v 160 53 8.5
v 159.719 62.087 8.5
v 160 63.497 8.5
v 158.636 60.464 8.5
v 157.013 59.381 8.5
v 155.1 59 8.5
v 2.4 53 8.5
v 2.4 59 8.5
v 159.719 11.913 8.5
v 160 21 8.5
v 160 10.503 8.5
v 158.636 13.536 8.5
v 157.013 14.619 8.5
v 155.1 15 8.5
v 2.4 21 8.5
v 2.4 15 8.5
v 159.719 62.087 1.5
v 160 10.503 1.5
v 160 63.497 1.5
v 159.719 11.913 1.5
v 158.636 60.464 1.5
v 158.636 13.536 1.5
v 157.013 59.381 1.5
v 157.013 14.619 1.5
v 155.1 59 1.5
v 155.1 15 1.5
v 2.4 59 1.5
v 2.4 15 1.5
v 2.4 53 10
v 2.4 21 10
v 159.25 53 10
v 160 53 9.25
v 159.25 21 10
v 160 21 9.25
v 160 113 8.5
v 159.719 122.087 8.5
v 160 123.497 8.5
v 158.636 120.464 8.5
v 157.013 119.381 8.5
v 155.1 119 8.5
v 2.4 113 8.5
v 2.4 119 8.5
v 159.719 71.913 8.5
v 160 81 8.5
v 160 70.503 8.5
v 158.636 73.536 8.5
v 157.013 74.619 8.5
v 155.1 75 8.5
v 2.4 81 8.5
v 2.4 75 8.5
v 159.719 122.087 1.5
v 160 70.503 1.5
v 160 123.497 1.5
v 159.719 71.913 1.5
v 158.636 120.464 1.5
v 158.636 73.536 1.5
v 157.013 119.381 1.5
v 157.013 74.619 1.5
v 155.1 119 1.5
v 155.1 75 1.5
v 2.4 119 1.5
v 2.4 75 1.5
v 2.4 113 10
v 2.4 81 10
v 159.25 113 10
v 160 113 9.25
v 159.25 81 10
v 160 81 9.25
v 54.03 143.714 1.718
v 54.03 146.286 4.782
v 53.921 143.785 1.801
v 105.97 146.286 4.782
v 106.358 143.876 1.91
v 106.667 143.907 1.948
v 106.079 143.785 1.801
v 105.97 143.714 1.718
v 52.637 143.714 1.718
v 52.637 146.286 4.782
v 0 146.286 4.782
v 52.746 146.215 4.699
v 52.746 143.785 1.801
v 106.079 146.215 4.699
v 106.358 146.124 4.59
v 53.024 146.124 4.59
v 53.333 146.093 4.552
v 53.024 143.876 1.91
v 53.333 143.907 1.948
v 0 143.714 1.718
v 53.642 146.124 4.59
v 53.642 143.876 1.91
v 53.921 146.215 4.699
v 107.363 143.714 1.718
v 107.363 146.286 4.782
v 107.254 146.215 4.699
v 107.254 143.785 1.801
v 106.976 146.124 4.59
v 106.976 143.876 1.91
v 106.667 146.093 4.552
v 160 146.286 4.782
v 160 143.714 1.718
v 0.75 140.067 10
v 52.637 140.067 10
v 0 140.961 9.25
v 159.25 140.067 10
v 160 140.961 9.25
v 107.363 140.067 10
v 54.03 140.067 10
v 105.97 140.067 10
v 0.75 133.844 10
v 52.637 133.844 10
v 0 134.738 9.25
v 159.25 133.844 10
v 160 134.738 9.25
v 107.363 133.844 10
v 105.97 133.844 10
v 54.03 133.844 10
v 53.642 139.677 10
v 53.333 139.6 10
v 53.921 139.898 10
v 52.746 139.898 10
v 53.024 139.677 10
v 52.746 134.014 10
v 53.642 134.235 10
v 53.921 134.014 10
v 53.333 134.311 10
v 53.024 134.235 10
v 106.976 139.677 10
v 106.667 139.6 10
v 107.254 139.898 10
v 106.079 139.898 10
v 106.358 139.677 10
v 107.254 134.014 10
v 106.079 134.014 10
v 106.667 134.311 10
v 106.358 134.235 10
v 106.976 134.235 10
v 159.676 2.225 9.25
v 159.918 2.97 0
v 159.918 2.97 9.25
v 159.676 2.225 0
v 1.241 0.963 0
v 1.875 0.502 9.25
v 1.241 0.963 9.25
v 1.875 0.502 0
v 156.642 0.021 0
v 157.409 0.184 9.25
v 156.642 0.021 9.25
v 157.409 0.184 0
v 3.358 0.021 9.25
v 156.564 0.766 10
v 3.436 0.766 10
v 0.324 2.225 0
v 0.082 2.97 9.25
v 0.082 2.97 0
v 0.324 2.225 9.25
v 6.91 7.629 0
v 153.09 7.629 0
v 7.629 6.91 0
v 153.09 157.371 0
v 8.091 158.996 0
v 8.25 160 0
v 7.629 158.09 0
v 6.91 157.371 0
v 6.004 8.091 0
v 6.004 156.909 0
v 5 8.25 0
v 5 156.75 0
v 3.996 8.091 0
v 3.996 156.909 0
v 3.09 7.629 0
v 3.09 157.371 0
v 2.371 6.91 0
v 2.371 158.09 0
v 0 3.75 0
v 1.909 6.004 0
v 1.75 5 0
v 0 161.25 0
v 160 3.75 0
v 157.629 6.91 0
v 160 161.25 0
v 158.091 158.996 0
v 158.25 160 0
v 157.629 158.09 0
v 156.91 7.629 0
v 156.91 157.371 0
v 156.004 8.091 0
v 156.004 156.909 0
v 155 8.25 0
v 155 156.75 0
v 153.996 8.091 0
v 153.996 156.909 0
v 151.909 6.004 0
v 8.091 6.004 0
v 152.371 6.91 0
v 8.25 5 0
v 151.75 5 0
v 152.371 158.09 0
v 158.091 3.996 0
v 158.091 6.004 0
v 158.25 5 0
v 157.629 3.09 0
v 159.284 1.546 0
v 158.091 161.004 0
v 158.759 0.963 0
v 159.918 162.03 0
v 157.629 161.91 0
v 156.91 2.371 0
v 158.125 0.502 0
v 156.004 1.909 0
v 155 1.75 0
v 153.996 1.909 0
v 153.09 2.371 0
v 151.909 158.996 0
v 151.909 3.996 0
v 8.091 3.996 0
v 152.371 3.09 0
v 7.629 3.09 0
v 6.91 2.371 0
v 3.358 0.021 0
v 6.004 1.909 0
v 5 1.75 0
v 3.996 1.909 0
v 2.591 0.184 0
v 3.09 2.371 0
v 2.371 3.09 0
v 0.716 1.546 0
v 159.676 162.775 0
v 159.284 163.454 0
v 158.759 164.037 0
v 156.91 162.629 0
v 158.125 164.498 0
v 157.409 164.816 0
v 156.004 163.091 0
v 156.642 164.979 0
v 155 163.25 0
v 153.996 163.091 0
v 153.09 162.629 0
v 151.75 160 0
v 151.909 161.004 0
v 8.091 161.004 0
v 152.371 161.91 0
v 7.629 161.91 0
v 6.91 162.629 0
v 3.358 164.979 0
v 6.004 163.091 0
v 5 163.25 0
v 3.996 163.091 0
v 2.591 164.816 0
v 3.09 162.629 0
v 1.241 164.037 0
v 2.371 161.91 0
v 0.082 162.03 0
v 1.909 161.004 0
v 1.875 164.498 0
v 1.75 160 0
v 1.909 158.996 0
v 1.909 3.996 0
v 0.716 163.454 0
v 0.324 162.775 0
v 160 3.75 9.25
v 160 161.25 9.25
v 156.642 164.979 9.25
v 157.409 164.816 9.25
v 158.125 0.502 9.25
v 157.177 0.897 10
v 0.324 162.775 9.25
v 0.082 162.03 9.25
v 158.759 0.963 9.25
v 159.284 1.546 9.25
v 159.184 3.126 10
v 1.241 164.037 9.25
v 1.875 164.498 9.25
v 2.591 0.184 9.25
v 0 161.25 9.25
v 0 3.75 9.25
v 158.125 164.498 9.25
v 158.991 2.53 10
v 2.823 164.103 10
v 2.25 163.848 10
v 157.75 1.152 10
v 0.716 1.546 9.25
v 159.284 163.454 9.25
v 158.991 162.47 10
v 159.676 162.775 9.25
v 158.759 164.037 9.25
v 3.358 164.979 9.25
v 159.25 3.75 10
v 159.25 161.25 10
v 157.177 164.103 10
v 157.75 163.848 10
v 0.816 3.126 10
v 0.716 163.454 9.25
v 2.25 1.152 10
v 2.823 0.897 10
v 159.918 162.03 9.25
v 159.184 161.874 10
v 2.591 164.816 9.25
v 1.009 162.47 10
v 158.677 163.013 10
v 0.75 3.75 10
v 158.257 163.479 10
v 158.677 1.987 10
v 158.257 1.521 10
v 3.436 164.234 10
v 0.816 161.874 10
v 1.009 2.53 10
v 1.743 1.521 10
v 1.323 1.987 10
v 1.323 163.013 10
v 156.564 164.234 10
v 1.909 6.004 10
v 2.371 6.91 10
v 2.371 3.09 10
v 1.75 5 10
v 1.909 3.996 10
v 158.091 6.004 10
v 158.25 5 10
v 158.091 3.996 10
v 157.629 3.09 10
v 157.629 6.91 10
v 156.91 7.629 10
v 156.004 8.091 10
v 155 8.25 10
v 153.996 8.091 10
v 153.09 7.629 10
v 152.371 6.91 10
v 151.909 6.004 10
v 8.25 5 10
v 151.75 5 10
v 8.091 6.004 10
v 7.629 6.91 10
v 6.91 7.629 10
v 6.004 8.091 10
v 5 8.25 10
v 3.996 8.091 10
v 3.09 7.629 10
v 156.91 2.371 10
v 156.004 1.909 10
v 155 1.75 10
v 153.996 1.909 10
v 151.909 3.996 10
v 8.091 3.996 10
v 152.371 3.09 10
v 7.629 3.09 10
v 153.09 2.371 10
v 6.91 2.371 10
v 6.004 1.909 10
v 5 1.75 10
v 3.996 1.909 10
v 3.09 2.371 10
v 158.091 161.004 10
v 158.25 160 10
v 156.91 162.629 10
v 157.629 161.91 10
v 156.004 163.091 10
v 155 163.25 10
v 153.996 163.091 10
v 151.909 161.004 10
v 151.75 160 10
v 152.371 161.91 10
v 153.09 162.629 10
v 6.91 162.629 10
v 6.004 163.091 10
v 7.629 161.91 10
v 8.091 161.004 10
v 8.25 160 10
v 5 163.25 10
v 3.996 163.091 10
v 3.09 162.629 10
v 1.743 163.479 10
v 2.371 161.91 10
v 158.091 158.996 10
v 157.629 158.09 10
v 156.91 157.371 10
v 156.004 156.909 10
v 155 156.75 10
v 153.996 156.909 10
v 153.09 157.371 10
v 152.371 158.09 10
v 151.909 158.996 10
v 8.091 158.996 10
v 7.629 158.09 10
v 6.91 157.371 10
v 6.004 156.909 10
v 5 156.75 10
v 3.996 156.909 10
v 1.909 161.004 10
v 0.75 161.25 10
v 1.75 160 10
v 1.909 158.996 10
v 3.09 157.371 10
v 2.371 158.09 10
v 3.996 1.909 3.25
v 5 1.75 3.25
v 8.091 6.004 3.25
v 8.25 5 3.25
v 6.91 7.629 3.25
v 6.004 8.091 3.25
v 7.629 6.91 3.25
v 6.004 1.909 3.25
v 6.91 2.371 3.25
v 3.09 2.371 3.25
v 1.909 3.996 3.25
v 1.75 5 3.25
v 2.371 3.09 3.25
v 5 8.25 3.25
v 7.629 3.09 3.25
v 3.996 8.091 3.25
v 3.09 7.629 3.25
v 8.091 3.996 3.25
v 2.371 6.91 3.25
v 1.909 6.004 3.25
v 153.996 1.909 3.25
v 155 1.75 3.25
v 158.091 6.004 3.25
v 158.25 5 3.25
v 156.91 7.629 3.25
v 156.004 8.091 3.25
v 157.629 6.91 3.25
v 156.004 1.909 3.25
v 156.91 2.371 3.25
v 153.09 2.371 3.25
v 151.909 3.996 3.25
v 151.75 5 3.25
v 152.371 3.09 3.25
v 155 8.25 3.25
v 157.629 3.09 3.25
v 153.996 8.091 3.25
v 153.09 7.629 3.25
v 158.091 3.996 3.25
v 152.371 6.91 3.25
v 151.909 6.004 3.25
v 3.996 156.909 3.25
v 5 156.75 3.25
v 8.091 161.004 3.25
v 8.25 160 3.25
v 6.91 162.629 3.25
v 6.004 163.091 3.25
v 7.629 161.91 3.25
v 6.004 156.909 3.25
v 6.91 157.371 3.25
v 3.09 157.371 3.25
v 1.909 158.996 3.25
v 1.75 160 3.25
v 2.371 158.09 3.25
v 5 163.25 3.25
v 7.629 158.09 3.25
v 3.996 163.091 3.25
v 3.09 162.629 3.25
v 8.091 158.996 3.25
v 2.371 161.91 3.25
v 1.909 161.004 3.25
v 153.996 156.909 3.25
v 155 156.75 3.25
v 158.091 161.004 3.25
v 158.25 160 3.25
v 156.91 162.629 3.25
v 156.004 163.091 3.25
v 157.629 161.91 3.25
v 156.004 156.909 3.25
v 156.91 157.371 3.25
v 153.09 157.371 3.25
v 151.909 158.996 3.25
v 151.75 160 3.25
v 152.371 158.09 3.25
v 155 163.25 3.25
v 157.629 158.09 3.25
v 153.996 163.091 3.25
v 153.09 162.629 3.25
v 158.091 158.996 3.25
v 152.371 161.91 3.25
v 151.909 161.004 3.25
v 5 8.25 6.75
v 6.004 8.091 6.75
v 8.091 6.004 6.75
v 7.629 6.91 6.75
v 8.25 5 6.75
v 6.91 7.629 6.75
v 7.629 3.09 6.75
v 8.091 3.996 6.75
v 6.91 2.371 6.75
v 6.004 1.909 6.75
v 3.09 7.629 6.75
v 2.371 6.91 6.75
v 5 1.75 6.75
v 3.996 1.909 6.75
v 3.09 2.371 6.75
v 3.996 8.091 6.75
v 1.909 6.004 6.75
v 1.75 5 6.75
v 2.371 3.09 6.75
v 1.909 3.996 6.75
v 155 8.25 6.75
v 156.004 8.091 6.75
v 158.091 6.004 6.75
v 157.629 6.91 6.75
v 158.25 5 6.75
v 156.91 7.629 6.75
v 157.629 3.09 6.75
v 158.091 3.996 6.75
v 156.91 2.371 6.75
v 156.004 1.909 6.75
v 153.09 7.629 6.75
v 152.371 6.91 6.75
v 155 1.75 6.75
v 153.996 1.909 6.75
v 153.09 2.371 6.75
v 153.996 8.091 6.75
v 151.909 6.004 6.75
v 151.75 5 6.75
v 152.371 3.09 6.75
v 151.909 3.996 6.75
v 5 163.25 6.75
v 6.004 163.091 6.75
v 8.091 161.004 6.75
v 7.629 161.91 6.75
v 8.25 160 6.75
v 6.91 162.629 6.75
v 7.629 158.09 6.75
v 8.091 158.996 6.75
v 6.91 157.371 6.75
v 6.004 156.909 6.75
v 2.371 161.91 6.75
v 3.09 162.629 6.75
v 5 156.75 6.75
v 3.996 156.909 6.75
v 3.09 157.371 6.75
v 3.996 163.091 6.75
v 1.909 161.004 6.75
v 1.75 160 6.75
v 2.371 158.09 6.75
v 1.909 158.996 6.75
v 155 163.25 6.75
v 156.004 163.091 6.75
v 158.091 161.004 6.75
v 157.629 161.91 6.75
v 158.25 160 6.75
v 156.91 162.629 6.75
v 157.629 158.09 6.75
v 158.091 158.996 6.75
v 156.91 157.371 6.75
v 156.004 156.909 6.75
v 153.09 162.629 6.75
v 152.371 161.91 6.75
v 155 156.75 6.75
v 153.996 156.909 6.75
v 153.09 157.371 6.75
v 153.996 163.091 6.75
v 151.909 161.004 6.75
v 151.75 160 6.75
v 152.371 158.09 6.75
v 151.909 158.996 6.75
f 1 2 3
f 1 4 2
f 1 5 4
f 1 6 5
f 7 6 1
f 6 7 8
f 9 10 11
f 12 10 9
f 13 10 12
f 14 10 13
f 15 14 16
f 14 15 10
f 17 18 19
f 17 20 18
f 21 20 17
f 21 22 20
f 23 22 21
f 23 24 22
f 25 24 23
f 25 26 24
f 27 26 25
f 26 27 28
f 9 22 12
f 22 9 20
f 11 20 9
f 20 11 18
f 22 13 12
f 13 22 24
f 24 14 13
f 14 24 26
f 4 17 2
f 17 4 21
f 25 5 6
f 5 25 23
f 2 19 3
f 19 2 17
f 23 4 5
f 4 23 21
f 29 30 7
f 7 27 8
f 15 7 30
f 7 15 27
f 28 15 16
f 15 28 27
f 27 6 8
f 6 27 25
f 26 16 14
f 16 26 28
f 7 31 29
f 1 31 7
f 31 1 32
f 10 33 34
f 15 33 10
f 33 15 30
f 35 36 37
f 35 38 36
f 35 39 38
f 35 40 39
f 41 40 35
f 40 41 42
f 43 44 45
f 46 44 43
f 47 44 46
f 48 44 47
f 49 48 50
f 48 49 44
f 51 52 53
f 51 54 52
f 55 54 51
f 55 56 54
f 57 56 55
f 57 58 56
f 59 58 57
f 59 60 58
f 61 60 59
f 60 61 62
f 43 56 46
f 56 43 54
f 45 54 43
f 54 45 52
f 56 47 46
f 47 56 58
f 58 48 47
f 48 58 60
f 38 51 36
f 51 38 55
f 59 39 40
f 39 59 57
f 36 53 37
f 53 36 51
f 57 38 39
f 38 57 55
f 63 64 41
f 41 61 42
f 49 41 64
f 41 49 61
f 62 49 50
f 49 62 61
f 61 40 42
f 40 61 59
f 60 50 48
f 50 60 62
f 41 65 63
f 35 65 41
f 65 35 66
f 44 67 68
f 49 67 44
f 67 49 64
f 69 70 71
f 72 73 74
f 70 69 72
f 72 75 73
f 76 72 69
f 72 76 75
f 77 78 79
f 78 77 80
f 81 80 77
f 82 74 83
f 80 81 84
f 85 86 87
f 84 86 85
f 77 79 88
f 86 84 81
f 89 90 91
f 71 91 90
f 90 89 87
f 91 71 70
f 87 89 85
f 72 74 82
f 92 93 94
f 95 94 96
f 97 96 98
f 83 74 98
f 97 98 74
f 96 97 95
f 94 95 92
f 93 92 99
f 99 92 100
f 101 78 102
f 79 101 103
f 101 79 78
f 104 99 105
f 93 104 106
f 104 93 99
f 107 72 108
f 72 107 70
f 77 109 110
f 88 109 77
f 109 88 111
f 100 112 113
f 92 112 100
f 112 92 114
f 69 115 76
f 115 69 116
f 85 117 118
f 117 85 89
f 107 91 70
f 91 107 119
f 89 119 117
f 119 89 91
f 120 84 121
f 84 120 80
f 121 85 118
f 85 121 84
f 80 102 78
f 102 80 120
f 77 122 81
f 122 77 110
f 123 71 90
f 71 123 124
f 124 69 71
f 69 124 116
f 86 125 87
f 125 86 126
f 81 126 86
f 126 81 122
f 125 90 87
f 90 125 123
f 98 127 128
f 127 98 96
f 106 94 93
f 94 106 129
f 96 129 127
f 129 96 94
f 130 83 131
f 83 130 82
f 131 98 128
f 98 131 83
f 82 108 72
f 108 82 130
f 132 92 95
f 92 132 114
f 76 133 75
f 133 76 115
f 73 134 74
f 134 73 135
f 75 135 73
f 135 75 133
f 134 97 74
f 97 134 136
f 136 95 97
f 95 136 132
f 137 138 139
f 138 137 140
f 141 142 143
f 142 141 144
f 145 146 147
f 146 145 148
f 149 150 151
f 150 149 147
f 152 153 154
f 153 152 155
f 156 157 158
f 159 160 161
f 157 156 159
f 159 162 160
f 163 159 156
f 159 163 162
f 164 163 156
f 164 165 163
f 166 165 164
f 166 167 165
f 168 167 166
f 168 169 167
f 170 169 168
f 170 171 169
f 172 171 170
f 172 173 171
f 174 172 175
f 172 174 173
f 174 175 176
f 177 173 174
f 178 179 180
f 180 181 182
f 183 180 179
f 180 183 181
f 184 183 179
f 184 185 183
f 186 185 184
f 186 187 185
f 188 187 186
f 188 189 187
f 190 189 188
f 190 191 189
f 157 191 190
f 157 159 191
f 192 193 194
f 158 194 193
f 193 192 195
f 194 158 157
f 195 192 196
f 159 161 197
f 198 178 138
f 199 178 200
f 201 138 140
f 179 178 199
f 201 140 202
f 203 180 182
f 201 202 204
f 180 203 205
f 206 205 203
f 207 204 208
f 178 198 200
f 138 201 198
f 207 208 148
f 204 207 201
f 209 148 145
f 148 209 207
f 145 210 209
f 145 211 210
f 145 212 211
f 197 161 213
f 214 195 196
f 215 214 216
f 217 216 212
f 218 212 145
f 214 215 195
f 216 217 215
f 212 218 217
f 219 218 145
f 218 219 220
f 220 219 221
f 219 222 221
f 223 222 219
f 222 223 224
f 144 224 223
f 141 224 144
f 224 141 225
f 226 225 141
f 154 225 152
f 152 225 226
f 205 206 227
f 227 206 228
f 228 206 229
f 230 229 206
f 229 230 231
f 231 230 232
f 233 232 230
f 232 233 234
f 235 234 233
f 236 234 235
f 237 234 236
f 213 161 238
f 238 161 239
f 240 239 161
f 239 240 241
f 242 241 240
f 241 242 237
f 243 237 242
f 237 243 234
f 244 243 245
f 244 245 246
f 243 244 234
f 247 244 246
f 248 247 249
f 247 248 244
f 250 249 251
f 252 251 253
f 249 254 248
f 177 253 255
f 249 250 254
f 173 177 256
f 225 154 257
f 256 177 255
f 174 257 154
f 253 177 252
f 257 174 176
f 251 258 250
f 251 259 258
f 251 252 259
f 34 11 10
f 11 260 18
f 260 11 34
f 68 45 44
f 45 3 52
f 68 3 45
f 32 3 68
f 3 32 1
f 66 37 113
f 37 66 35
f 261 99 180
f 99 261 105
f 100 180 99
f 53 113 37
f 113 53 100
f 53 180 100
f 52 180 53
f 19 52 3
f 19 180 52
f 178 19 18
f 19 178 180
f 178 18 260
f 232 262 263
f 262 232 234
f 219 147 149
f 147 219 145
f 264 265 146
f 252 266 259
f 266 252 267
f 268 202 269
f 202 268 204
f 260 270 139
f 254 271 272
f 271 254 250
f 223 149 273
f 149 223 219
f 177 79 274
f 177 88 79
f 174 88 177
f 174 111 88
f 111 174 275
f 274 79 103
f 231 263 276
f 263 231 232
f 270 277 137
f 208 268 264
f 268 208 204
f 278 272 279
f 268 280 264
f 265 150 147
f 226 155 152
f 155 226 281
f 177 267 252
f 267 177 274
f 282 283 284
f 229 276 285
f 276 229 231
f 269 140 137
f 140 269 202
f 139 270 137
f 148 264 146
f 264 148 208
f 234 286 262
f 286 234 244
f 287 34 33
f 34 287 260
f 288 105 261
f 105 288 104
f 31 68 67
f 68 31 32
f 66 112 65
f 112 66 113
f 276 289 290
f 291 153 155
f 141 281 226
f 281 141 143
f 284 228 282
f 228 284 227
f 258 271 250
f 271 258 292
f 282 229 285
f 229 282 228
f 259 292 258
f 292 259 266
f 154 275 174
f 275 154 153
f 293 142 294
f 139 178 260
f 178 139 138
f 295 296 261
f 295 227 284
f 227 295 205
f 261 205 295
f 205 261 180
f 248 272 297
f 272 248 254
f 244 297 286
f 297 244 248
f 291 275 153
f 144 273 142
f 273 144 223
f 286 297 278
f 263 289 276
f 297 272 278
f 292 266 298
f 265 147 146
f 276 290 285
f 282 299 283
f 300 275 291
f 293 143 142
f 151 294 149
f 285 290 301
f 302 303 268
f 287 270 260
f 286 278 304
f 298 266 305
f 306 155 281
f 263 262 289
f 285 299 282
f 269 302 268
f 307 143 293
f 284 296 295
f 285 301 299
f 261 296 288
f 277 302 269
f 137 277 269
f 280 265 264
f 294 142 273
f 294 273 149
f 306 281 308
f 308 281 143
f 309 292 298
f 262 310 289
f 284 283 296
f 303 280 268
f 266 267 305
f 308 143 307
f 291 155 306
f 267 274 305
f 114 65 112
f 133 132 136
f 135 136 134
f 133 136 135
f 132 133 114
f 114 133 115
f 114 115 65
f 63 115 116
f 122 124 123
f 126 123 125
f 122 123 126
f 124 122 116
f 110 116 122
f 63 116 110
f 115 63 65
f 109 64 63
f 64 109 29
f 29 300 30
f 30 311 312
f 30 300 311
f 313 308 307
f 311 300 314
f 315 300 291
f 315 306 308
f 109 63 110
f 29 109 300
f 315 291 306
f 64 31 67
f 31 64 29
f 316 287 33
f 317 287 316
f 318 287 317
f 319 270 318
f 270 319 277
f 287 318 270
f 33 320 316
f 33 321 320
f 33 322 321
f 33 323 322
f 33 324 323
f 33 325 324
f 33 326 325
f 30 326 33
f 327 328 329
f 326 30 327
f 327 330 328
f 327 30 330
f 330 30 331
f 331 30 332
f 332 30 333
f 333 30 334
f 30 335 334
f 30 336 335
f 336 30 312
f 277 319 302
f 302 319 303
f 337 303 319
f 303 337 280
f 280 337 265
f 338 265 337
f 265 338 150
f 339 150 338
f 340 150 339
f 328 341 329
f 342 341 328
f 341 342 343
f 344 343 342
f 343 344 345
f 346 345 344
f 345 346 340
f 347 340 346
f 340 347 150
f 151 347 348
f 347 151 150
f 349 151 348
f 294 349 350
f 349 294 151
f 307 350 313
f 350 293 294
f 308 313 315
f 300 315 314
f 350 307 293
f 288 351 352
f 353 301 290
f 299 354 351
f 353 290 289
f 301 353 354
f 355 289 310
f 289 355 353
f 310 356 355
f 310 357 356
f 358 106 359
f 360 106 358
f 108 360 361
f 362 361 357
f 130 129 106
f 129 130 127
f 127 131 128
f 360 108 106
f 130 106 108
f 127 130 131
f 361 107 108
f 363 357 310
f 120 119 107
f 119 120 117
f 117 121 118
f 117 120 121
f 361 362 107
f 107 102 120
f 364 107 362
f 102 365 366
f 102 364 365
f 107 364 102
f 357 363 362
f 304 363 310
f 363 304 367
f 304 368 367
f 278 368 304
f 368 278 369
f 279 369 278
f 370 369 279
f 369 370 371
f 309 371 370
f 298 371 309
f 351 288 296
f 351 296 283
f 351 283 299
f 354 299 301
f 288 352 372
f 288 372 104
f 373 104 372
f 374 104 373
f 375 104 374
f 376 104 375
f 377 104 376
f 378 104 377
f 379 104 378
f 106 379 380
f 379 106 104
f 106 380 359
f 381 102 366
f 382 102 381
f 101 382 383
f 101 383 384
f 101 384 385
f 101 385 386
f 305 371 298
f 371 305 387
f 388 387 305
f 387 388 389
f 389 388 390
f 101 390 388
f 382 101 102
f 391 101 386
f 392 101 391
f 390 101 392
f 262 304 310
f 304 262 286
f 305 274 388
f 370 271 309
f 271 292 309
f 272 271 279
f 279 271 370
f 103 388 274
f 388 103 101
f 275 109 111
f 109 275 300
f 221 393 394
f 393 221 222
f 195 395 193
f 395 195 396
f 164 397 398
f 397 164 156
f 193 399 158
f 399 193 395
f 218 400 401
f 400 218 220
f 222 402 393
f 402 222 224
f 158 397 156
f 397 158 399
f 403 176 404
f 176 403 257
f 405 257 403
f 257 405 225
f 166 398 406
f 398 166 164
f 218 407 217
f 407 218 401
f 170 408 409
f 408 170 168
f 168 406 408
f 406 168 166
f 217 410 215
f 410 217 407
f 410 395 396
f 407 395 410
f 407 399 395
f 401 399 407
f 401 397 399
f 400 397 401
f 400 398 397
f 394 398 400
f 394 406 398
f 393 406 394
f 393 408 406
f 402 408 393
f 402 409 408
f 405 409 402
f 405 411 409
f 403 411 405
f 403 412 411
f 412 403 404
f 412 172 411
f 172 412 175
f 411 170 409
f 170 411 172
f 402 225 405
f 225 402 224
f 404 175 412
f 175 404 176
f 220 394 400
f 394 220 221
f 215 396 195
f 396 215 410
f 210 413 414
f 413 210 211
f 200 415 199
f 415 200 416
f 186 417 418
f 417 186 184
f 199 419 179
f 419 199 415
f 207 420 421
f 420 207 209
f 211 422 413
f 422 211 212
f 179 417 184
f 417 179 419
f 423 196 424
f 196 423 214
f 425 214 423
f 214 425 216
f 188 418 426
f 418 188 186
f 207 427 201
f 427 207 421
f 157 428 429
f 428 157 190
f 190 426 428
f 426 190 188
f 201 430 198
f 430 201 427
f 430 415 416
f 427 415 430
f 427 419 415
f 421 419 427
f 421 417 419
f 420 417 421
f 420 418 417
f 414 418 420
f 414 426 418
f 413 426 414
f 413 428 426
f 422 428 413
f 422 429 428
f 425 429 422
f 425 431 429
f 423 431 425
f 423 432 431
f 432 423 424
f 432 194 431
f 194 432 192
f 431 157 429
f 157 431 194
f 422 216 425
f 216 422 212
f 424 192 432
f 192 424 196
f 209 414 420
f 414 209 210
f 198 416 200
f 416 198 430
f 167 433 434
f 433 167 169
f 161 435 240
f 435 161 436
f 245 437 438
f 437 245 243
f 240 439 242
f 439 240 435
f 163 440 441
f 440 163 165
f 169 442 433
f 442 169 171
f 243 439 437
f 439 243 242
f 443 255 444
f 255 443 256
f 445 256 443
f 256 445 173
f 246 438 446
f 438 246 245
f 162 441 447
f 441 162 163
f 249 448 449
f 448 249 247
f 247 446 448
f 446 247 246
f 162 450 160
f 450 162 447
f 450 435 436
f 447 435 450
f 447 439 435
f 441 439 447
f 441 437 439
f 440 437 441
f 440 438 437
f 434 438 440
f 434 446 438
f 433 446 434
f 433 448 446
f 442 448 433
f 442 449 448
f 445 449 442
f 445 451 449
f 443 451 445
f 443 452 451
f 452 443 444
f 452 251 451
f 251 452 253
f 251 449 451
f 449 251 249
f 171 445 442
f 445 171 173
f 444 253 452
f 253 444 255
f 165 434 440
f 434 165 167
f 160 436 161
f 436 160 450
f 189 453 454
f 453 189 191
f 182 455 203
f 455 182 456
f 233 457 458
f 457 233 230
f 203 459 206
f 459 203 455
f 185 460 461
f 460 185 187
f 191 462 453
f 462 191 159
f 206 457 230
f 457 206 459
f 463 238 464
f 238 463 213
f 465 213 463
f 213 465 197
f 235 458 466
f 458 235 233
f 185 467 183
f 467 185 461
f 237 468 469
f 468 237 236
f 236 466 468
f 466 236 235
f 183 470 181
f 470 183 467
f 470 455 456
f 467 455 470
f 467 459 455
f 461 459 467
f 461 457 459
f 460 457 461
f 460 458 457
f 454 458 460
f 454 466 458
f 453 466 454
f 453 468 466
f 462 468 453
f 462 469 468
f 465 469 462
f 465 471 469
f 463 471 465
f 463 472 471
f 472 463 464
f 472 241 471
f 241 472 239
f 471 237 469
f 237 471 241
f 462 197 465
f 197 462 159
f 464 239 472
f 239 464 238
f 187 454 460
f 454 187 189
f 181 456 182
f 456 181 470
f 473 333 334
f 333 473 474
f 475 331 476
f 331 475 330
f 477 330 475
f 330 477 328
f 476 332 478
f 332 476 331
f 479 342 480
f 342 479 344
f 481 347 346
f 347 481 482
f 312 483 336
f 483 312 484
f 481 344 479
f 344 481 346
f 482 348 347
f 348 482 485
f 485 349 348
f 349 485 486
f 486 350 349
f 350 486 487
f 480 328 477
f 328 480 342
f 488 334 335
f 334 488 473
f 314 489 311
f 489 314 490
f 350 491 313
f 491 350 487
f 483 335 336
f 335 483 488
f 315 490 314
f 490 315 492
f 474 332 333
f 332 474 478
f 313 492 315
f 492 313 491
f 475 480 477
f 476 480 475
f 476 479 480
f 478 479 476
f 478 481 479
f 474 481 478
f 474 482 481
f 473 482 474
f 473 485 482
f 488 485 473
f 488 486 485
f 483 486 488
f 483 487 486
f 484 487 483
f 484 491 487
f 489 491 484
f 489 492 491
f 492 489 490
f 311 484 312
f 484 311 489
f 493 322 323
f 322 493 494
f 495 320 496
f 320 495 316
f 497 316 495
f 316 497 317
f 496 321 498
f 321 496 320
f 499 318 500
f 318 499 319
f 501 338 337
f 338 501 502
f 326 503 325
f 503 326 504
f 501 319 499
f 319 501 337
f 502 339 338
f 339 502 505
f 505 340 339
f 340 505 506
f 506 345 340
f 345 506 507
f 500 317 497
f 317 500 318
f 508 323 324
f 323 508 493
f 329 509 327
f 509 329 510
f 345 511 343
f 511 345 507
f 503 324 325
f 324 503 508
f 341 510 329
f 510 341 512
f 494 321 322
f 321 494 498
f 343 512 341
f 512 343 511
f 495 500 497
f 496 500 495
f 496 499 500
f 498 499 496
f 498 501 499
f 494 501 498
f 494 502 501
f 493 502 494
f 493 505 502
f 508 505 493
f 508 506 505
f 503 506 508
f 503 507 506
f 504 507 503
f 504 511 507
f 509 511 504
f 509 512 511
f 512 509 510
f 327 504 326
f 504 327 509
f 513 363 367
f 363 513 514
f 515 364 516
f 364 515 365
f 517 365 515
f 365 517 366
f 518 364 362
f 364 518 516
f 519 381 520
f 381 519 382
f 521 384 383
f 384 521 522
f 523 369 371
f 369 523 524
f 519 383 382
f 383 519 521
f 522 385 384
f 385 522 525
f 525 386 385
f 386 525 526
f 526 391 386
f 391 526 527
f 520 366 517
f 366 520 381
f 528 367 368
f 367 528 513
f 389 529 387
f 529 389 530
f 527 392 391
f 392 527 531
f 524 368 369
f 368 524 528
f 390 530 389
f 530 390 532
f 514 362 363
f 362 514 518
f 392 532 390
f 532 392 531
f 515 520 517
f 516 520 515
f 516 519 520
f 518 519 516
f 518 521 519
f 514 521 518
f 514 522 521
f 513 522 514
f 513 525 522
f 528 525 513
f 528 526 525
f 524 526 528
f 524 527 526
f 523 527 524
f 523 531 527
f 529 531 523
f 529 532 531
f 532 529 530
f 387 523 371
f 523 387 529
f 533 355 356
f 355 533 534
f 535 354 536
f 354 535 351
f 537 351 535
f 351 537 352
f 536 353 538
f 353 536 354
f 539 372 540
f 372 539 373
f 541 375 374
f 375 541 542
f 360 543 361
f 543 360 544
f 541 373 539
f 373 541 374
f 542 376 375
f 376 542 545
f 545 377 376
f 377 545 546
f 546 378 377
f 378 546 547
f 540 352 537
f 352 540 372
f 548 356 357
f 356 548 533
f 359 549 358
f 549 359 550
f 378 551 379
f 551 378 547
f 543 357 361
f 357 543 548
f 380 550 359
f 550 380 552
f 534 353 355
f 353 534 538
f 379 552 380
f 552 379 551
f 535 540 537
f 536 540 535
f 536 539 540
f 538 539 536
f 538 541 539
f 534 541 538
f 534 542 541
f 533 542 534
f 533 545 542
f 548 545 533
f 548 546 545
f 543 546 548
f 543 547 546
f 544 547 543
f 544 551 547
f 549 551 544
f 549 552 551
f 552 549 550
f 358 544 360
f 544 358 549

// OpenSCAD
// file: 10mm-bits.scad
inset = 0.0;
cornerRad=3.75;
trayHt=10;
xDim = 160;
yDim = 165;
wallThick = 2.4;
bottomThick = 1.5;

bottomMagnets = 1;

epsilon = 0.1;

module slot(slotWidth=44,topWidth=32) {
   cube([xDim-wallThick,slotWidth,7]);
   difference() {
      translate([xDim-wallThick-5+epsilon,-5,0])
         cube([5,slotWidth+10,7]);
      translate([xDim-wallThick-5+epsilon,-5,-epsilon])
         cylinder(r=5,h=7+2*epsilon);
      translate([xDim-wallThick-5+epsilon,44+5,-epsilon]) // 42?
         cylinder(r=5,h=7+2*epsilon);
   }
   translate([0,(slotWidth-topWidth)/2,0]) cube([xDim-wallThick+epsilon,topWidth,trayHt+epsilon]);
}

module rulerSlot() {
   translate([0,0,bottomThick]) rotate([50,0,0]) {
      difference() {
         translate([-epsilon,-2,0]) cube([xDim + 2*epsilon,4,15]);
         translate([xDim/3,2.7,-epsilon]) cylinder($fn=20,r=1,h=15+2*epsilon);
         translate([xDim/3,-2.7,-epsilon]) cylinder($fn=20,r=1,h=15+2*epsilon);
         translate([2*xDim/3,2.7,-epsilon]) cylinder($fn=20,r=1,h=15+2*epsilon);
         translate([2*xDim/3,-2.7,-epsilon]) cylinder($fn=20,r=1,h=15+2*epsilon);
      }
   }
}

module mediumSlot() {
   slot(slotWidth=64,topWidth=52);
}

module smallSlot() {
   slot(slotWidth=44,topWidth=32);
}


/* corner rounded posts */
module cornerPosts() {
   postRad = 5.5;
   translate([postRad, postRad, 0])
      cylinder($fn=30, r=postRad,h=trayHt);
   translate([xDim - postRad, postRad, 0]) 
      cylinder($fn=30, r=postRad,h=trayHt);
   translate([postRad, yDim - postRad, 0]) 
      cylinder($fn=30, r=postRad,h=trayHt);
   translate([xDim - postRad, yDim - postRad, 0]) 
      cylinder($fn=30, r=postRad,h=trayHt);
}

module magnetHoles() {
   magnetOffset = 1.75;
   magnetRad = 3.25;

   /* bottom */
   if (bottomMagnets) {
      translate([magnetOffset+magnetRad, magnetOffset+magnetRad, -epsilon])
         cylinder($fn=20, r=magnetRad, h=3.25+epsilon);
      translate([xDim - magnetOffset-magnetRad, magnetOffset+magnetRad, -epsilon])
         cylinder($fn=20, r=magnetRad, h=3.25+epsilon);
      translate([magnetOffset+magnetRad, yDim - magnetOffset-magnetRad, -epsilon])
         cylinder($fn=20, r=magnetRad, h=3.25+epsilon);
      translate([xDim -magnetOffset-magnetRad, yDim - magnetOffset-magnetRad, -epsilon])
         cylinder($fn=20, r=magnetRad, h=3.25+epsilon);
   }

   /* top */
   translate([magnetOffset+magnetRad, magnetOffset+magnetRad, trayHt-3.25])
      cylinder($fn=20, r=magnetRad, h=3.25+epsilon);
   translate([xDim - magnetOffset-magnetRad, magnetOffset+magnetRad, trayHt-3.25])
      cylinder($fn=20, r=magnetRad, h=3.25+epsilon);
   translate([magnetOffset+magnetRad, yDim - magnetOffset-magnetRad, trayHt-3.25])
      cylinder($fn=20, r=magnetRad, h=3.25+epsilon);
   translate([xDim -magnetOffset-magnetRad, yDim - magnetOffset-magnetRad, trayHt-3.25])
      cylinder($fn=20, r=magnetRad, h=3.25+epsilon);
}

/* trayHull() -- this is the hull of the thing */
module trayHull() {
   botRad = cornerRad - inset;
   topInset = 0.75;

   hull() {
      /* bottom may be smaller */
      translate([cornerRad, cornerRad, 0])
         cylinder($fn=30, r=botRad,h=1);
      translate([xDim - cornerRad, cornerRad, 0]) 
         cylinder($fn=30, r=botRad,h=1);
      translate([cornerRad, yDim - cornerRad, 0]) 
         cylinder($fn=30, r=botRad,h=1);
      translate([xDim - cornerRad, yDim - cornerRad, 0]) 
         cylinder($fn=30, r=botRad,h=1);

      /* this creates a slight inset on the top edge */
      if (1) {
         /* near top */
         translate([cornerRad, cornerRad, trayHt-1-topInset])
            cylinder($fn=30, r=cornerRad,h=1);
         translate([xDim - cornerRad, cornerRad, trayHt-1-topInset]) 
            cylinder($fn=30, r=cornerRad,h=1);
         translate([cornerRad, yDim - cornerRad, trayHt-1-topInset]) 
            cylinder($fn=30, r=cornerRad,h=1);
         translate([xDim - cornerRad, yDim - cornerRad, trayHt-1-topInset]) 
            cylinder($fn=30, r=cornerRad,h=1);
      }

      /* top, slightly inset */
      translate([cornerRad, cornerRad, trayHt-1])
         cylinder($fn=30, r=cornerRad-topInset,h=1);
      translate([xDim - cornerRad, cornerRad, trayHt-1]) 
         cylinder($fn=30, r=cornerRad-topInset,h=1);
      translate([cornerRad, yDim - cornerRad, trayHt-1]) 
         cylinder($fn=30, r=cornerRad-topInset,h=1);
      translate([xDim - cornerRad, yDim - cornerRad, trayHt-1]) 
         cylinder($fn=30, r=cornerRad-topInset,h=1);
   }
}
// main file
include <10mm-bits.scad>

tray();

/* tray() -- final form, with magnet holes removed */
module tray() {
   difference() {
      /* remove anything that might have come out of the intended hull */
      intersection() {
         baseShape();
         trayHull();
      }

      /* cut out magnet holes */
      magnetHoles();
   }
}

/* baseShape() -- tray with cut out interior */
module baseShape() {
   difference() {
      trayHull();

      /* cut out interior */
      translate([wallThick,15,bottomThick]) smallSlot();
      translate([wallThick,yDim-90,bottomThick]) smallSlot();

      translate([0,yDim-20,1.75]) rulerSlot();
   }

   cornerPosts();
}
